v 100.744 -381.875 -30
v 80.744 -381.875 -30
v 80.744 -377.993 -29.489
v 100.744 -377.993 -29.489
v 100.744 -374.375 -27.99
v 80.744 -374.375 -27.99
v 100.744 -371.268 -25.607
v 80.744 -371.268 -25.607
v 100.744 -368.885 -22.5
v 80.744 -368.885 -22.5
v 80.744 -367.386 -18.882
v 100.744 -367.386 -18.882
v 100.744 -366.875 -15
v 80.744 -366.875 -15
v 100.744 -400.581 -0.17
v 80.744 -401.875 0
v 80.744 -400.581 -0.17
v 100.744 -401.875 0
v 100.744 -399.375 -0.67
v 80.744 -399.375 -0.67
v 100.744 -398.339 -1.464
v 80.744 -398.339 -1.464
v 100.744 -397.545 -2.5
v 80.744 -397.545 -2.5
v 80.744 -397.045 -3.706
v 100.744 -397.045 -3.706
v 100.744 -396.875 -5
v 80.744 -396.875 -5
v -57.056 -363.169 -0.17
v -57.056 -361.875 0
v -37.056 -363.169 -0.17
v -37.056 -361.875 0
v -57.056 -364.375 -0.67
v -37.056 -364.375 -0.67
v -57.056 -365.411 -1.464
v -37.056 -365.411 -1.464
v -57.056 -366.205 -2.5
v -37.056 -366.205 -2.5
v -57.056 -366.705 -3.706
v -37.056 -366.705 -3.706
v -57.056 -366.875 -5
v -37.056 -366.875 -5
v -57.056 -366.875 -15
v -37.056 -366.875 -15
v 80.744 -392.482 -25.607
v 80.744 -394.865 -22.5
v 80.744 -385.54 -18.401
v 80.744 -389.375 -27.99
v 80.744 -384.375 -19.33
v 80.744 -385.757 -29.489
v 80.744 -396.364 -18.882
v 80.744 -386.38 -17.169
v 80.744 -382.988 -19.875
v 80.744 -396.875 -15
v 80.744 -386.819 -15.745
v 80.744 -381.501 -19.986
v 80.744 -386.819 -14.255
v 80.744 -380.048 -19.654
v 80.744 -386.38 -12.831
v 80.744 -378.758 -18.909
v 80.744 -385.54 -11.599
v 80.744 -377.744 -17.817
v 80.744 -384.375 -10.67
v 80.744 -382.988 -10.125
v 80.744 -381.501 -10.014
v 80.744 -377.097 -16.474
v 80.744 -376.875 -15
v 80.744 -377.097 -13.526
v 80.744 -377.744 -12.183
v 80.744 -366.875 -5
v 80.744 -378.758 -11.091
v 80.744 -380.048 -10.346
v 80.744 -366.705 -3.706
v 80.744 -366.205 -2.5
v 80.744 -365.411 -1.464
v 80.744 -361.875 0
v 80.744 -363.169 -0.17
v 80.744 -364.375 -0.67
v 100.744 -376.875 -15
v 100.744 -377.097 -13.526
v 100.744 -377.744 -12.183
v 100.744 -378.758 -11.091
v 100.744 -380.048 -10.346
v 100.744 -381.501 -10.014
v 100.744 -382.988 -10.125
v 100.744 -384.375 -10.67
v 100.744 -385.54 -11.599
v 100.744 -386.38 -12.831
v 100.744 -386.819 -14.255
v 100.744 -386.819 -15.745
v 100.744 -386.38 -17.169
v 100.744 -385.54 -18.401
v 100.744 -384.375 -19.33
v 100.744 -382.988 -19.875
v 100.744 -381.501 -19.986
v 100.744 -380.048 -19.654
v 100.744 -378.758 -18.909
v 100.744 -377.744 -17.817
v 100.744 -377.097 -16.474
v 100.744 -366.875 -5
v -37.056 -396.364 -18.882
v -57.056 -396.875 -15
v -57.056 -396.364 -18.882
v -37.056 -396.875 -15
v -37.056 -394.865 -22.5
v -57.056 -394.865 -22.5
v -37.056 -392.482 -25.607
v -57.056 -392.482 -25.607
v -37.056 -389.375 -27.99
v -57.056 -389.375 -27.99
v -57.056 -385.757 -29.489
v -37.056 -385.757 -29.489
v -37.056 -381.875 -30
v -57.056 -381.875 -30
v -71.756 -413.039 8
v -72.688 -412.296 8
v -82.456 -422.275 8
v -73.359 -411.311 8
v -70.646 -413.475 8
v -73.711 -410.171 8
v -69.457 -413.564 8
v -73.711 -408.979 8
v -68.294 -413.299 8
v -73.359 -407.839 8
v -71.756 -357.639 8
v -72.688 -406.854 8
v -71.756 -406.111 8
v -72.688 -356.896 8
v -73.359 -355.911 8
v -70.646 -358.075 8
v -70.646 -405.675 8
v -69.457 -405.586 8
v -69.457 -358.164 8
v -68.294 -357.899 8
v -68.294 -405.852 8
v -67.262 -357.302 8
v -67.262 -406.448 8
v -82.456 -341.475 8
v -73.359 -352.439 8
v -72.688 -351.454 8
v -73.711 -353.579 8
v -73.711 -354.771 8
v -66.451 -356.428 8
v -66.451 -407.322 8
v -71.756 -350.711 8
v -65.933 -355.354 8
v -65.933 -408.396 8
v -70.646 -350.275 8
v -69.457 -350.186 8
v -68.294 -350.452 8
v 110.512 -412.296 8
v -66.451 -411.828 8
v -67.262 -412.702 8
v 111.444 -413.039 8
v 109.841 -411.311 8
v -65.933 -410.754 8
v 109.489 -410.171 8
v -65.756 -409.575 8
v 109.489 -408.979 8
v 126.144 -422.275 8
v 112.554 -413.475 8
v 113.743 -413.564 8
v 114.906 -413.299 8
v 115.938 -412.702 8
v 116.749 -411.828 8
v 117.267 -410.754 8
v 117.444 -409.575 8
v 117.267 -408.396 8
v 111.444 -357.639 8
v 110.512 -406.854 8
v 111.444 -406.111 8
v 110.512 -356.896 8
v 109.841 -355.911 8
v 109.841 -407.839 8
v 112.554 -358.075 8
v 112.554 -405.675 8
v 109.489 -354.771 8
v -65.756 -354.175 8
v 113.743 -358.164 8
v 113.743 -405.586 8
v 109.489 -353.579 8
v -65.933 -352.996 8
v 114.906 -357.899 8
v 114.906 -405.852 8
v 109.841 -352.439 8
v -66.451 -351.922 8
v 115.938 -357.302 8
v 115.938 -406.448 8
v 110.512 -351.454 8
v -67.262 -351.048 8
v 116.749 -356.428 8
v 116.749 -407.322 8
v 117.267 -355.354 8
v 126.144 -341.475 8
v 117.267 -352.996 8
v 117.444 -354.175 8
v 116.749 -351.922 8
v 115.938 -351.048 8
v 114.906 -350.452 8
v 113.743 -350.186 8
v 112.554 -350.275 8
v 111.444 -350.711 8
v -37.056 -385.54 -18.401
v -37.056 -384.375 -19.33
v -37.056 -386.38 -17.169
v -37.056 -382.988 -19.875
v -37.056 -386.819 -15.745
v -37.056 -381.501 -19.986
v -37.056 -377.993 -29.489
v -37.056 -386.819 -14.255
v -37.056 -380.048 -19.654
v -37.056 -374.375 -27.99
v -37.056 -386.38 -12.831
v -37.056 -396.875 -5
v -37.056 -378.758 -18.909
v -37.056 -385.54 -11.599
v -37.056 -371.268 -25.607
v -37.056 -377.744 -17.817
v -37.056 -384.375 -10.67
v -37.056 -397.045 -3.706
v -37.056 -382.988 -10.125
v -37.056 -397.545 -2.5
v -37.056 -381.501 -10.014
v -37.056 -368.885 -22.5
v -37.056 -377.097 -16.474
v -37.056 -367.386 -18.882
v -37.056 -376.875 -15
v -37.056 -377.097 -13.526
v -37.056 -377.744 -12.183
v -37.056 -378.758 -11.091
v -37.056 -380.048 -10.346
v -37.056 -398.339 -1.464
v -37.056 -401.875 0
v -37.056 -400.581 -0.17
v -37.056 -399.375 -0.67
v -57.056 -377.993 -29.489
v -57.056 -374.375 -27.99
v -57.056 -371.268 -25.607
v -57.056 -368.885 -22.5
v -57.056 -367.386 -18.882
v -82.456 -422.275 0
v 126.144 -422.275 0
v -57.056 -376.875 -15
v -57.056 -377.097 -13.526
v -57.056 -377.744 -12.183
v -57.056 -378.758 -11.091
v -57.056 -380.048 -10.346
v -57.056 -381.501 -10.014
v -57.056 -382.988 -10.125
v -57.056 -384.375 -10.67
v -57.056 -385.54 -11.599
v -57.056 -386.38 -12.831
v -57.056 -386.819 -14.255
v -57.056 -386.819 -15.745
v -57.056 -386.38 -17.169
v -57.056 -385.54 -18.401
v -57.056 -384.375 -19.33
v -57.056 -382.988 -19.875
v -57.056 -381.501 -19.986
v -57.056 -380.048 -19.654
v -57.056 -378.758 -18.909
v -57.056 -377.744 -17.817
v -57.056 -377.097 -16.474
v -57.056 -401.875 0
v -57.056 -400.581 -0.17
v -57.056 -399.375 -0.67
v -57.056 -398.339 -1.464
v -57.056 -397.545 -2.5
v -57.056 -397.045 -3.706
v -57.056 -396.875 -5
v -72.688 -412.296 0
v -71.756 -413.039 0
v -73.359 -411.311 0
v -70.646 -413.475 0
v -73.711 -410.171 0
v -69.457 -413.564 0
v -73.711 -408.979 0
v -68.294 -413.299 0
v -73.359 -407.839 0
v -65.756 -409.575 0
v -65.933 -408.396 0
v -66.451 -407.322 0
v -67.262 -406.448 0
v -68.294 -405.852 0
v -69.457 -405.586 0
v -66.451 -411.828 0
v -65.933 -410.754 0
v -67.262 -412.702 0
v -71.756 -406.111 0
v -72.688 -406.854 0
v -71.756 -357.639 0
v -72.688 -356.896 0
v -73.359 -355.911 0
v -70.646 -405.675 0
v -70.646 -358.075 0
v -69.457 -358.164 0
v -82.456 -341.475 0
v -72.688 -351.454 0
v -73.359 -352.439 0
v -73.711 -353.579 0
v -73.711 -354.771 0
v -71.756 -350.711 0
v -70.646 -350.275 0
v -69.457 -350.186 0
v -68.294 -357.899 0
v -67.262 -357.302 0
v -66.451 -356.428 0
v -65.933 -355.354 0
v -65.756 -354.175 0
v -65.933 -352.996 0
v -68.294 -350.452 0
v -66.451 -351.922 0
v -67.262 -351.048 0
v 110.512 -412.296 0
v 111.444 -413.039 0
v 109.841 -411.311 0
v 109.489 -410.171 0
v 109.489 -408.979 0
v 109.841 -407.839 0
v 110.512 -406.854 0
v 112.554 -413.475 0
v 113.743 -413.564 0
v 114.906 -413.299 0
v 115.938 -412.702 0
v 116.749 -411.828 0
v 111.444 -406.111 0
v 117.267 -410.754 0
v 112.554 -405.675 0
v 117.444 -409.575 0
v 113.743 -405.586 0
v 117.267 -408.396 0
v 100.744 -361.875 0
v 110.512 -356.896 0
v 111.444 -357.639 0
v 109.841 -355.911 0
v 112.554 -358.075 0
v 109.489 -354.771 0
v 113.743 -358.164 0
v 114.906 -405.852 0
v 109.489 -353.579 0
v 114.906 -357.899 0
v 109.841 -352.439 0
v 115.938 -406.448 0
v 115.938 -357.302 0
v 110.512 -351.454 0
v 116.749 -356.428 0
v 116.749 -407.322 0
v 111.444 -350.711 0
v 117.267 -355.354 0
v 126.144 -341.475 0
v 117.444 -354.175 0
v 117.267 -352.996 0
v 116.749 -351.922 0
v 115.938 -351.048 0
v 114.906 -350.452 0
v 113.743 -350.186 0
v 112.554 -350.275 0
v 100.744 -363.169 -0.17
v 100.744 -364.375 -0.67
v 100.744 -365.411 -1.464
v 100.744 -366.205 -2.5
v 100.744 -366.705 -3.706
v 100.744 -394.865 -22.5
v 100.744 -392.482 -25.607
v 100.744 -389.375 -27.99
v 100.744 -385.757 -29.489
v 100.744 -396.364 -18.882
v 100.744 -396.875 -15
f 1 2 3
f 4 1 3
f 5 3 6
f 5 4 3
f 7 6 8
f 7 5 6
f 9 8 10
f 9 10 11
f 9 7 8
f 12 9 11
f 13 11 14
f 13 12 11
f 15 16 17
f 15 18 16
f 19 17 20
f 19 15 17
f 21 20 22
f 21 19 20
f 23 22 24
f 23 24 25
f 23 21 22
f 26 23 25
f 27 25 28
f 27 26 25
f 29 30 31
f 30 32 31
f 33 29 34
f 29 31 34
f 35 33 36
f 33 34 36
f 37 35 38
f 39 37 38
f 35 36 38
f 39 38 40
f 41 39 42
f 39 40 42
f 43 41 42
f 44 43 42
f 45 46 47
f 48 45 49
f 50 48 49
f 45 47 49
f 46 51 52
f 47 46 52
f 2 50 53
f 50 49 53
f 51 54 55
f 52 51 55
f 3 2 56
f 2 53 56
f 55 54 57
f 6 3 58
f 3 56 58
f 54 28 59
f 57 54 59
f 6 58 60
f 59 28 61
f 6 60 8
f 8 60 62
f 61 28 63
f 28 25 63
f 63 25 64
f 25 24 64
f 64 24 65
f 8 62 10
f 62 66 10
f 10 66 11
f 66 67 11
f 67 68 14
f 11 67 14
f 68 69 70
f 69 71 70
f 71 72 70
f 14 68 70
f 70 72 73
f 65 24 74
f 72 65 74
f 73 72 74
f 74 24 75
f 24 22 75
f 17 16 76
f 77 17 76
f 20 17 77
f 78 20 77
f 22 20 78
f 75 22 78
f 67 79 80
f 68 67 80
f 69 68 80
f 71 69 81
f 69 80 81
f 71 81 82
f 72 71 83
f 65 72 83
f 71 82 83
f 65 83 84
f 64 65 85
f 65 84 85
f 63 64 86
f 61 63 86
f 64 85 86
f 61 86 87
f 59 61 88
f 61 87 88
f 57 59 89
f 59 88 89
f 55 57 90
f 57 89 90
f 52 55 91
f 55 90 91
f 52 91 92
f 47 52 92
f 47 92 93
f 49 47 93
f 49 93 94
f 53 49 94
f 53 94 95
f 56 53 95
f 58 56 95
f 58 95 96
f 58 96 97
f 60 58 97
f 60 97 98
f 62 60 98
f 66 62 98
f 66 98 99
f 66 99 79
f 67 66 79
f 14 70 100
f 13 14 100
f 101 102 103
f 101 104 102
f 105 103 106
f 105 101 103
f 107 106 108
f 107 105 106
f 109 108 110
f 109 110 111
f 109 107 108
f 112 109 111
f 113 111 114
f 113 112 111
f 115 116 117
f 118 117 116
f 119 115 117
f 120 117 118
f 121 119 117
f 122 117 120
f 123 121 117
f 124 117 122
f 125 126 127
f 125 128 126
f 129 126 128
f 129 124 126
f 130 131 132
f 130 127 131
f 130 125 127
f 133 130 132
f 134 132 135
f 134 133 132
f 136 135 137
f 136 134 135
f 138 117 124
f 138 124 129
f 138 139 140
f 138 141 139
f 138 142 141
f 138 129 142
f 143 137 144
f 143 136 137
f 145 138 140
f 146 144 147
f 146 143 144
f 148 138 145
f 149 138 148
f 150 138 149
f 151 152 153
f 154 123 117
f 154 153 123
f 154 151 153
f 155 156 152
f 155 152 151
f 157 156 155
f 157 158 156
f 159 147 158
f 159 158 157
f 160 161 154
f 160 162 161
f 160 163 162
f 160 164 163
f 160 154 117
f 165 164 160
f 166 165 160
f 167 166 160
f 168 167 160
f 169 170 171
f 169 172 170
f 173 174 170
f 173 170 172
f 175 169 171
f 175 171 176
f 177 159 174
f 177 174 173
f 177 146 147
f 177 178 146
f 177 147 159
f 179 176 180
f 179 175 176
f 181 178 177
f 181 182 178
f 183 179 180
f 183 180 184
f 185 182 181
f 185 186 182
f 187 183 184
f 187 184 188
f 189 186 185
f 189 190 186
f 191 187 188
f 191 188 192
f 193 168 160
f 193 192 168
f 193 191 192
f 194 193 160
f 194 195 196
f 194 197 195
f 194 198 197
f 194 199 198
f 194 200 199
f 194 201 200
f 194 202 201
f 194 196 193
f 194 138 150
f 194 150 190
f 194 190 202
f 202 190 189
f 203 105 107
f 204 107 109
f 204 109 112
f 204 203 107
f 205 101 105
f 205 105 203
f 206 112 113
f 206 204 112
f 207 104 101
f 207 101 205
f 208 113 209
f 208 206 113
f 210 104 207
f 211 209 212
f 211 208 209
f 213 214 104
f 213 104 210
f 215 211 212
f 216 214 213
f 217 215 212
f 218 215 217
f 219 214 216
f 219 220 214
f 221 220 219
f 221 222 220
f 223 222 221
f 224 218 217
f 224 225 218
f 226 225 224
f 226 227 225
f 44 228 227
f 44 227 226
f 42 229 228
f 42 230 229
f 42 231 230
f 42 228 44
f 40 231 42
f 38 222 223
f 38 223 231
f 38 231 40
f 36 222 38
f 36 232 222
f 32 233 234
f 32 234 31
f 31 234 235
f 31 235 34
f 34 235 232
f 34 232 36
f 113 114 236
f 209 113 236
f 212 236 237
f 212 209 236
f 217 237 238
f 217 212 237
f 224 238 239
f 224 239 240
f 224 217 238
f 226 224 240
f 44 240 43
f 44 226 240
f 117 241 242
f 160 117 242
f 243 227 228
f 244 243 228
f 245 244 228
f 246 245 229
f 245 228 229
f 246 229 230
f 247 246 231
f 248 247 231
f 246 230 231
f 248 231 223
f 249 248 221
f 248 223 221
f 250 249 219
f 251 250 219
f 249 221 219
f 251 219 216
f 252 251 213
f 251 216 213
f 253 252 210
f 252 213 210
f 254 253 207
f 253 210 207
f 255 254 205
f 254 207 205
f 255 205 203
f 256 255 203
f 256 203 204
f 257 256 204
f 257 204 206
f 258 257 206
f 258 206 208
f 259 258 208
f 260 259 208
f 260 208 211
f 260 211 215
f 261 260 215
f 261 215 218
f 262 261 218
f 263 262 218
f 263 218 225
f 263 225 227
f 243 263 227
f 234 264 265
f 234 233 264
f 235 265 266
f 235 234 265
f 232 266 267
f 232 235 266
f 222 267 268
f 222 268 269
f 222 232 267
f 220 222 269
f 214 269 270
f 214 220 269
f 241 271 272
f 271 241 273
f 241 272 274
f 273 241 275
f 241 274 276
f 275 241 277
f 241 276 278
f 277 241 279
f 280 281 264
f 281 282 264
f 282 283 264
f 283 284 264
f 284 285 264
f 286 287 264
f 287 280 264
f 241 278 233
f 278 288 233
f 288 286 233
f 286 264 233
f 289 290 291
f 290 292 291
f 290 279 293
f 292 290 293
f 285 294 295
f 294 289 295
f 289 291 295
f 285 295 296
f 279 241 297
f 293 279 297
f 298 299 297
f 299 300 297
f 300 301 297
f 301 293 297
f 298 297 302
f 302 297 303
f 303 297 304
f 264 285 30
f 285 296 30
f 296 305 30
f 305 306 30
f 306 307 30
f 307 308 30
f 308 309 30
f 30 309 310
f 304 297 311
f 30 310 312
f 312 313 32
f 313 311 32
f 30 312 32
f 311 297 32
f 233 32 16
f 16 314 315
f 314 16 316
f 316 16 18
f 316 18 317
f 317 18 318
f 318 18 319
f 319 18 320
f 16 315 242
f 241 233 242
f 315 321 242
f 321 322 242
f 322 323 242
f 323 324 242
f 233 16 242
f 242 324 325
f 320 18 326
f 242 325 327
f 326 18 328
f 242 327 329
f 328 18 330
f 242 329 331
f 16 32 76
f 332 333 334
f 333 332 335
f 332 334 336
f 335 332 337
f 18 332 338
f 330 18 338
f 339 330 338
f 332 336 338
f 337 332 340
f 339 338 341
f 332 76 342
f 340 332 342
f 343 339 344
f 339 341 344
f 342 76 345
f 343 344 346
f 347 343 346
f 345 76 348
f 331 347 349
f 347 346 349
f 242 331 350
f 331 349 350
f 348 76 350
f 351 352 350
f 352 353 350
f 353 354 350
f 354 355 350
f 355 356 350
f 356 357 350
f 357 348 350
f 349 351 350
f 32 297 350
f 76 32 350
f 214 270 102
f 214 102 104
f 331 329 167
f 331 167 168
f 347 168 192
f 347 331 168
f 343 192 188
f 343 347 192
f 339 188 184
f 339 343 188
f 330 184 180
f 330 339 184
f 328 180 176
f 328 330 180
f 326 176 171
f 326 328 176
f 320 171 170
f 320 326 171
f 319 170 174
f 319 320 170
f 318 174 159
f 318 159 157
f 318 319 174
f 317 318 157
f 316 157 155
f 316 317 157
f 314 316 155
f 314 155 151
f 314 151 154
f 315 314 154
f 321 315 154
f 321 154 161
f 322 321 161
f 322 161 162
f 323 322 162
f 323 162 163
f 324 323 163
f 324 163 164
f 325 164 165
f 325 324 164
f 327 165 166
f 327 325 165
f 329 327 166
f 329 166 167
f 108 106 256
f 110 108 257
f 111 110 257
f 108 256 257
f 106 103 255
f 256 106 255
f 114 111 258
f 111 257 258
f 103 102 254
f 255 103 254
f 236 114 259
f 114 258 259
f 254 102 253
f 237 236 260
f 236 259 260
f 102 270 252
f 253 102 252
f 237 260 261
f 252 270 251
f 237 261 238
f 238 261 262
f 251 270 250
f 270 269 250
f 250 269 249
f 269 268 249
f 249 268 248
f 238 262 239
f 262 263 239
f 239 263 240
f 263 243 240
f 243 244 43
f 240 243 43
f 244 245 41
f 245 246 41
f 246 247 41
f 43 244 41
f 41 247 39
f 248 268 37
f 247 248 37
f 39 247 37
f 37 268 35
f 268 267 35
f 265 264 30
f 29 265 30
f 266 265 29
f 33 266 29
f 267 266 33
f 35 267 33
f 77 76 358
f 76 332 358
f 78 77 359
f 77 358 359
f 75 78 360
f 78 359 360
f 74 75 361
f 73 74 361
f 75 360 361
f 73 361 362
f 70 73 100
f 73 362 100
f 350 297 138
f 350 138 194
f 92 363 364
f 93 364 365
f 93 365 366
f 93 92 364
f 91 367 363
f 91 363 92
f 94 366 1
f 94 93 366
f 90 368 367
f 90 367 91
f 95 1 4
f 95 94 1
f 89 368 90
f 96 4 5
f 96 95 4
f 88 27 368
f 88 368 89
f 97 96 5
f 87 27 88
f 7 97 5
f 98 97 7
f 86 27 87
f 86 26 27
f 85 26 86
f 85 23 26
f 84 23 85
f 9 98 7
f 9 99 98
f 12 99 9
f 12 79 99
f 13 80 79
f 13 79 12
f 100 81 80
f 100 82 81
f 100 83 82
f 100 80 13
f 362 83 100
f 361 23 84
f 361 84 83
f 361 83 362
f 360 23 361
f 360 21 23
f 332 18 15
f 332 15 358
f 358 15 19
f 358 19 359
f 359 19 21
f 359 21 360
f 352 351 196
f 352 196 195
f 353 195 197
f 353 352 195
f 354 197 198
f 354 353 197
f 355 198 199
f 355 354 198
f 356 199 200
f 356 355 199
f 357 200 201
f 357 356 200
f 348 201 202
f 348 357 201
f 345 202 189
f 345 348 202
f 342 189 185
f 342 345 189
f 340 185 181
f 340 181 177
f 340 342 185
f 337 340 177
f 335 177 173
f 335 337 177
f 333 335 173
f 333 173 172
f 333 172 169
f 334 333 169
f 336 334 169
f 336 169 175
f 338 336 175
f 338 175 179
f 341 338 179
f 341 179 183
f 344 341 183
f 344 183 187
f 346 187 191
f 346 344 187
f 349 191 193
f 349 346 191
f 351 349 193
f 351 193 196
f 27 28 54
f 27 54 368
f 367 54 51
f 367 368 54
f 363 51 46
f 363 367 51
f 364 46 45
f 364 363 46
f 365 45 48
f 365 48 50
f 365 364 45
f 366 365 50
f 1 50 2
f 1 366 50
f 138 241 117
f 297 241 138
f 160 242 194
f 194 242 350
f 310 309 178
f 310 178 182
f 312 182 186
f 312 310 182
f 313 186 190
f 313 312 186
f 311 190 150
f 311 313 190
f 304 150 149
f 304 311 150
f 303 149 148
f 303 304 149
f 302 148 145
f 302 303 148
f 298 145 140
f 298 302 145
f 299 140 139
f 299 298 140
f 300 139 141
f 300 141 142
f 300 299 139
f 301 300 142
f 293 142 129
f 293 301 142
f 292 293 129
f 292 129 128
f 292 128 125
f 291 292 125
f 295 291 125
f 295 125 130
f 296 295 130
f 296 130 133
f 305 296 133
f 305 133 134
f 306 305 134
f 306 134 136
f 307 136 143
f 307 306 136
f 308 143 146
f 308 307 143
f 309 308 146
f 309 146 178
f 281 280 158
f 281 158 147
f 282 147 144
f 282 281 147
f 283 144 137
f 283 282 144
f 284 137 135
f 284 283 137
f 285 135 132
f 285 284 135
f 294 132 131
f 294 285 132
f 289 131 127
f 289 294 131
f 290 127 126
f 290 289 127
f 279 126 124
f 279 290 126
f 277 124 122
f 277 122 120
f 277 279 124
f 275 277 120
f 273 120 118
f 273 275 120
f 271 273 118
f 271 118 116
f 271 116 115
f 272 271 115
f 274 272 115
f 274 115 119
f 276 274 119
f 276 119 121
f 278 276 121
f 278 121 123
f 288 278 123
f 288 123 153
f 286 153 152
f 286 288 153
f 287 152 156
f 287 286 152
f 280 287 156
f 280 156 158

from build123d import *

# Parameters (mm, degrees)
SKETCH1_W           = 208.6
SKETCH1_H           = 80.8
SKETCH1_R           = 4
SKETCH1_W_2         = 20
SKETCH1_H_2         = 30
BOSS_EXTRUDE1_DEPTH = 8
SKETCH1_3_W         = 20
SKETCH1_3_H         = 30
BOSS_EXTRUDE2_DEPTH = 30
FILLET1_R           = 5
FILLET2_R           = 15
SKETCH2_R           = 5
CUT_EXTRUDE1_DEPTH  = 462.279122908


with BuildPart() as part:
    # Sketch1 → Boss-Extrude1 (new body)
    # profile 1 of 3: a face of its own
    with BuildSketch(Plane.XY):
        with Locations((21.844388387, -381.87501611)):
            Rectangle(SKETCH1_W, SKETCH1_H)
        with Locations((113.444388387, -409.57501611)):
            Circle(SKETCH1_R, mode=Mode.SUBTRACT)
        with Locations((-69.755611613, -354.17501611)):
            Circle(SKETCH1_R, mode=Mode.SUBTRACT)
        with Locations((-69.755611613, -409.57501611)):
            Circle(SKETCH1_R, mode=Mode.SUBTRACT)
        with Locations((113.444388387, -354.17501611)):
            Circle(SKETCH1_R, mode=Mode.SUBTRACT)
        with Locations((90.744388387, -381.87501611)):
            Rectangle(SKETCH1_W_2, SKETCH1_H_2, mode=Mode.SUBTRACT)
        with Locations((-47.055611613, -381.87501611)):
            Rectangle(SKETCH1_W_2, SKETCH1_H_2, mode=Mode.SUBTRACT)
    # profile 2 of 3: a face of its own
    with BuildSketch(Plane.XY):
        with Locations((-47.055611613, -381.87501611)):
            Rectangle(SKETCH1_W_2, SKETCH1_H_2)
    # profile 3 of 3: a face of its own
    with BuildSketch(Plane.XY):
        with Locations((90.744388387, -381.87501611)):
            Rectangle(SKETCH1_W_2, SKETCH1_H_2)
    extrude(amount=BOSS_EXTRUDE1_DEPTH)

    # Sketch1<3> → Boss-Extrude2 (add)
    with BuildSketch(Plane.XY):
        with Locations((90.744388387, -381.87501611)):
            Rectangle(SKETCH1_3_W, SKETCH1_3_H)
        with Locations((-47.055611613, -381.87501611)):
            Rectangle(SKETCH1_3_W, SKETCH1_3_H)
    extrude(amount=-BOSS_EXTRUDE2_DEPTH)

    # Fillet1
    fillet1_edges = [part.edges().sort_by_distance(p)[0] for p in [
        (90.744388387, -366.87501611, 0),
        (90.744388387, -396.87501611, 0),
        (-47.055611613, -366.87501611, 0),
        (-47.055611613, -396.87501611, 0),
    ]]
    fillet(fillet1_edges, radius=FILLET1_R)

    # Fillet2
    fillet2_edges = [part.edges().sort_by_distance(p)[0] for p in [
        (90.744388387, -366.87501611, -30),
        (90.744388387, -396.87501611, -30),
        (-47.055611613, -396.87501611, -30),
        (-47.055611613, -366.87501611, -30),
    ]]
    fillet(fillet2_edges, radius=FILLET2_R - 0.0001)  # a hair under: the kernel refuses the full size

    # Sketch2 → Cut-Extrude1 (cut, through all)
    with BuildSketch(Plane(origin=(100.744388387, 0, 0), x_dir=(0, 0, -1), z_dir=(1, 0, 0))):
        with Locations(Location((15, -381.87501611, 0), (0, 0, 90))):
            Circle(SKETCH2_R)
    extrude(amount=-CUT_EXTRUDE1_DEPTH, mode=Mode.SUBTRACT)


solid = part.part
